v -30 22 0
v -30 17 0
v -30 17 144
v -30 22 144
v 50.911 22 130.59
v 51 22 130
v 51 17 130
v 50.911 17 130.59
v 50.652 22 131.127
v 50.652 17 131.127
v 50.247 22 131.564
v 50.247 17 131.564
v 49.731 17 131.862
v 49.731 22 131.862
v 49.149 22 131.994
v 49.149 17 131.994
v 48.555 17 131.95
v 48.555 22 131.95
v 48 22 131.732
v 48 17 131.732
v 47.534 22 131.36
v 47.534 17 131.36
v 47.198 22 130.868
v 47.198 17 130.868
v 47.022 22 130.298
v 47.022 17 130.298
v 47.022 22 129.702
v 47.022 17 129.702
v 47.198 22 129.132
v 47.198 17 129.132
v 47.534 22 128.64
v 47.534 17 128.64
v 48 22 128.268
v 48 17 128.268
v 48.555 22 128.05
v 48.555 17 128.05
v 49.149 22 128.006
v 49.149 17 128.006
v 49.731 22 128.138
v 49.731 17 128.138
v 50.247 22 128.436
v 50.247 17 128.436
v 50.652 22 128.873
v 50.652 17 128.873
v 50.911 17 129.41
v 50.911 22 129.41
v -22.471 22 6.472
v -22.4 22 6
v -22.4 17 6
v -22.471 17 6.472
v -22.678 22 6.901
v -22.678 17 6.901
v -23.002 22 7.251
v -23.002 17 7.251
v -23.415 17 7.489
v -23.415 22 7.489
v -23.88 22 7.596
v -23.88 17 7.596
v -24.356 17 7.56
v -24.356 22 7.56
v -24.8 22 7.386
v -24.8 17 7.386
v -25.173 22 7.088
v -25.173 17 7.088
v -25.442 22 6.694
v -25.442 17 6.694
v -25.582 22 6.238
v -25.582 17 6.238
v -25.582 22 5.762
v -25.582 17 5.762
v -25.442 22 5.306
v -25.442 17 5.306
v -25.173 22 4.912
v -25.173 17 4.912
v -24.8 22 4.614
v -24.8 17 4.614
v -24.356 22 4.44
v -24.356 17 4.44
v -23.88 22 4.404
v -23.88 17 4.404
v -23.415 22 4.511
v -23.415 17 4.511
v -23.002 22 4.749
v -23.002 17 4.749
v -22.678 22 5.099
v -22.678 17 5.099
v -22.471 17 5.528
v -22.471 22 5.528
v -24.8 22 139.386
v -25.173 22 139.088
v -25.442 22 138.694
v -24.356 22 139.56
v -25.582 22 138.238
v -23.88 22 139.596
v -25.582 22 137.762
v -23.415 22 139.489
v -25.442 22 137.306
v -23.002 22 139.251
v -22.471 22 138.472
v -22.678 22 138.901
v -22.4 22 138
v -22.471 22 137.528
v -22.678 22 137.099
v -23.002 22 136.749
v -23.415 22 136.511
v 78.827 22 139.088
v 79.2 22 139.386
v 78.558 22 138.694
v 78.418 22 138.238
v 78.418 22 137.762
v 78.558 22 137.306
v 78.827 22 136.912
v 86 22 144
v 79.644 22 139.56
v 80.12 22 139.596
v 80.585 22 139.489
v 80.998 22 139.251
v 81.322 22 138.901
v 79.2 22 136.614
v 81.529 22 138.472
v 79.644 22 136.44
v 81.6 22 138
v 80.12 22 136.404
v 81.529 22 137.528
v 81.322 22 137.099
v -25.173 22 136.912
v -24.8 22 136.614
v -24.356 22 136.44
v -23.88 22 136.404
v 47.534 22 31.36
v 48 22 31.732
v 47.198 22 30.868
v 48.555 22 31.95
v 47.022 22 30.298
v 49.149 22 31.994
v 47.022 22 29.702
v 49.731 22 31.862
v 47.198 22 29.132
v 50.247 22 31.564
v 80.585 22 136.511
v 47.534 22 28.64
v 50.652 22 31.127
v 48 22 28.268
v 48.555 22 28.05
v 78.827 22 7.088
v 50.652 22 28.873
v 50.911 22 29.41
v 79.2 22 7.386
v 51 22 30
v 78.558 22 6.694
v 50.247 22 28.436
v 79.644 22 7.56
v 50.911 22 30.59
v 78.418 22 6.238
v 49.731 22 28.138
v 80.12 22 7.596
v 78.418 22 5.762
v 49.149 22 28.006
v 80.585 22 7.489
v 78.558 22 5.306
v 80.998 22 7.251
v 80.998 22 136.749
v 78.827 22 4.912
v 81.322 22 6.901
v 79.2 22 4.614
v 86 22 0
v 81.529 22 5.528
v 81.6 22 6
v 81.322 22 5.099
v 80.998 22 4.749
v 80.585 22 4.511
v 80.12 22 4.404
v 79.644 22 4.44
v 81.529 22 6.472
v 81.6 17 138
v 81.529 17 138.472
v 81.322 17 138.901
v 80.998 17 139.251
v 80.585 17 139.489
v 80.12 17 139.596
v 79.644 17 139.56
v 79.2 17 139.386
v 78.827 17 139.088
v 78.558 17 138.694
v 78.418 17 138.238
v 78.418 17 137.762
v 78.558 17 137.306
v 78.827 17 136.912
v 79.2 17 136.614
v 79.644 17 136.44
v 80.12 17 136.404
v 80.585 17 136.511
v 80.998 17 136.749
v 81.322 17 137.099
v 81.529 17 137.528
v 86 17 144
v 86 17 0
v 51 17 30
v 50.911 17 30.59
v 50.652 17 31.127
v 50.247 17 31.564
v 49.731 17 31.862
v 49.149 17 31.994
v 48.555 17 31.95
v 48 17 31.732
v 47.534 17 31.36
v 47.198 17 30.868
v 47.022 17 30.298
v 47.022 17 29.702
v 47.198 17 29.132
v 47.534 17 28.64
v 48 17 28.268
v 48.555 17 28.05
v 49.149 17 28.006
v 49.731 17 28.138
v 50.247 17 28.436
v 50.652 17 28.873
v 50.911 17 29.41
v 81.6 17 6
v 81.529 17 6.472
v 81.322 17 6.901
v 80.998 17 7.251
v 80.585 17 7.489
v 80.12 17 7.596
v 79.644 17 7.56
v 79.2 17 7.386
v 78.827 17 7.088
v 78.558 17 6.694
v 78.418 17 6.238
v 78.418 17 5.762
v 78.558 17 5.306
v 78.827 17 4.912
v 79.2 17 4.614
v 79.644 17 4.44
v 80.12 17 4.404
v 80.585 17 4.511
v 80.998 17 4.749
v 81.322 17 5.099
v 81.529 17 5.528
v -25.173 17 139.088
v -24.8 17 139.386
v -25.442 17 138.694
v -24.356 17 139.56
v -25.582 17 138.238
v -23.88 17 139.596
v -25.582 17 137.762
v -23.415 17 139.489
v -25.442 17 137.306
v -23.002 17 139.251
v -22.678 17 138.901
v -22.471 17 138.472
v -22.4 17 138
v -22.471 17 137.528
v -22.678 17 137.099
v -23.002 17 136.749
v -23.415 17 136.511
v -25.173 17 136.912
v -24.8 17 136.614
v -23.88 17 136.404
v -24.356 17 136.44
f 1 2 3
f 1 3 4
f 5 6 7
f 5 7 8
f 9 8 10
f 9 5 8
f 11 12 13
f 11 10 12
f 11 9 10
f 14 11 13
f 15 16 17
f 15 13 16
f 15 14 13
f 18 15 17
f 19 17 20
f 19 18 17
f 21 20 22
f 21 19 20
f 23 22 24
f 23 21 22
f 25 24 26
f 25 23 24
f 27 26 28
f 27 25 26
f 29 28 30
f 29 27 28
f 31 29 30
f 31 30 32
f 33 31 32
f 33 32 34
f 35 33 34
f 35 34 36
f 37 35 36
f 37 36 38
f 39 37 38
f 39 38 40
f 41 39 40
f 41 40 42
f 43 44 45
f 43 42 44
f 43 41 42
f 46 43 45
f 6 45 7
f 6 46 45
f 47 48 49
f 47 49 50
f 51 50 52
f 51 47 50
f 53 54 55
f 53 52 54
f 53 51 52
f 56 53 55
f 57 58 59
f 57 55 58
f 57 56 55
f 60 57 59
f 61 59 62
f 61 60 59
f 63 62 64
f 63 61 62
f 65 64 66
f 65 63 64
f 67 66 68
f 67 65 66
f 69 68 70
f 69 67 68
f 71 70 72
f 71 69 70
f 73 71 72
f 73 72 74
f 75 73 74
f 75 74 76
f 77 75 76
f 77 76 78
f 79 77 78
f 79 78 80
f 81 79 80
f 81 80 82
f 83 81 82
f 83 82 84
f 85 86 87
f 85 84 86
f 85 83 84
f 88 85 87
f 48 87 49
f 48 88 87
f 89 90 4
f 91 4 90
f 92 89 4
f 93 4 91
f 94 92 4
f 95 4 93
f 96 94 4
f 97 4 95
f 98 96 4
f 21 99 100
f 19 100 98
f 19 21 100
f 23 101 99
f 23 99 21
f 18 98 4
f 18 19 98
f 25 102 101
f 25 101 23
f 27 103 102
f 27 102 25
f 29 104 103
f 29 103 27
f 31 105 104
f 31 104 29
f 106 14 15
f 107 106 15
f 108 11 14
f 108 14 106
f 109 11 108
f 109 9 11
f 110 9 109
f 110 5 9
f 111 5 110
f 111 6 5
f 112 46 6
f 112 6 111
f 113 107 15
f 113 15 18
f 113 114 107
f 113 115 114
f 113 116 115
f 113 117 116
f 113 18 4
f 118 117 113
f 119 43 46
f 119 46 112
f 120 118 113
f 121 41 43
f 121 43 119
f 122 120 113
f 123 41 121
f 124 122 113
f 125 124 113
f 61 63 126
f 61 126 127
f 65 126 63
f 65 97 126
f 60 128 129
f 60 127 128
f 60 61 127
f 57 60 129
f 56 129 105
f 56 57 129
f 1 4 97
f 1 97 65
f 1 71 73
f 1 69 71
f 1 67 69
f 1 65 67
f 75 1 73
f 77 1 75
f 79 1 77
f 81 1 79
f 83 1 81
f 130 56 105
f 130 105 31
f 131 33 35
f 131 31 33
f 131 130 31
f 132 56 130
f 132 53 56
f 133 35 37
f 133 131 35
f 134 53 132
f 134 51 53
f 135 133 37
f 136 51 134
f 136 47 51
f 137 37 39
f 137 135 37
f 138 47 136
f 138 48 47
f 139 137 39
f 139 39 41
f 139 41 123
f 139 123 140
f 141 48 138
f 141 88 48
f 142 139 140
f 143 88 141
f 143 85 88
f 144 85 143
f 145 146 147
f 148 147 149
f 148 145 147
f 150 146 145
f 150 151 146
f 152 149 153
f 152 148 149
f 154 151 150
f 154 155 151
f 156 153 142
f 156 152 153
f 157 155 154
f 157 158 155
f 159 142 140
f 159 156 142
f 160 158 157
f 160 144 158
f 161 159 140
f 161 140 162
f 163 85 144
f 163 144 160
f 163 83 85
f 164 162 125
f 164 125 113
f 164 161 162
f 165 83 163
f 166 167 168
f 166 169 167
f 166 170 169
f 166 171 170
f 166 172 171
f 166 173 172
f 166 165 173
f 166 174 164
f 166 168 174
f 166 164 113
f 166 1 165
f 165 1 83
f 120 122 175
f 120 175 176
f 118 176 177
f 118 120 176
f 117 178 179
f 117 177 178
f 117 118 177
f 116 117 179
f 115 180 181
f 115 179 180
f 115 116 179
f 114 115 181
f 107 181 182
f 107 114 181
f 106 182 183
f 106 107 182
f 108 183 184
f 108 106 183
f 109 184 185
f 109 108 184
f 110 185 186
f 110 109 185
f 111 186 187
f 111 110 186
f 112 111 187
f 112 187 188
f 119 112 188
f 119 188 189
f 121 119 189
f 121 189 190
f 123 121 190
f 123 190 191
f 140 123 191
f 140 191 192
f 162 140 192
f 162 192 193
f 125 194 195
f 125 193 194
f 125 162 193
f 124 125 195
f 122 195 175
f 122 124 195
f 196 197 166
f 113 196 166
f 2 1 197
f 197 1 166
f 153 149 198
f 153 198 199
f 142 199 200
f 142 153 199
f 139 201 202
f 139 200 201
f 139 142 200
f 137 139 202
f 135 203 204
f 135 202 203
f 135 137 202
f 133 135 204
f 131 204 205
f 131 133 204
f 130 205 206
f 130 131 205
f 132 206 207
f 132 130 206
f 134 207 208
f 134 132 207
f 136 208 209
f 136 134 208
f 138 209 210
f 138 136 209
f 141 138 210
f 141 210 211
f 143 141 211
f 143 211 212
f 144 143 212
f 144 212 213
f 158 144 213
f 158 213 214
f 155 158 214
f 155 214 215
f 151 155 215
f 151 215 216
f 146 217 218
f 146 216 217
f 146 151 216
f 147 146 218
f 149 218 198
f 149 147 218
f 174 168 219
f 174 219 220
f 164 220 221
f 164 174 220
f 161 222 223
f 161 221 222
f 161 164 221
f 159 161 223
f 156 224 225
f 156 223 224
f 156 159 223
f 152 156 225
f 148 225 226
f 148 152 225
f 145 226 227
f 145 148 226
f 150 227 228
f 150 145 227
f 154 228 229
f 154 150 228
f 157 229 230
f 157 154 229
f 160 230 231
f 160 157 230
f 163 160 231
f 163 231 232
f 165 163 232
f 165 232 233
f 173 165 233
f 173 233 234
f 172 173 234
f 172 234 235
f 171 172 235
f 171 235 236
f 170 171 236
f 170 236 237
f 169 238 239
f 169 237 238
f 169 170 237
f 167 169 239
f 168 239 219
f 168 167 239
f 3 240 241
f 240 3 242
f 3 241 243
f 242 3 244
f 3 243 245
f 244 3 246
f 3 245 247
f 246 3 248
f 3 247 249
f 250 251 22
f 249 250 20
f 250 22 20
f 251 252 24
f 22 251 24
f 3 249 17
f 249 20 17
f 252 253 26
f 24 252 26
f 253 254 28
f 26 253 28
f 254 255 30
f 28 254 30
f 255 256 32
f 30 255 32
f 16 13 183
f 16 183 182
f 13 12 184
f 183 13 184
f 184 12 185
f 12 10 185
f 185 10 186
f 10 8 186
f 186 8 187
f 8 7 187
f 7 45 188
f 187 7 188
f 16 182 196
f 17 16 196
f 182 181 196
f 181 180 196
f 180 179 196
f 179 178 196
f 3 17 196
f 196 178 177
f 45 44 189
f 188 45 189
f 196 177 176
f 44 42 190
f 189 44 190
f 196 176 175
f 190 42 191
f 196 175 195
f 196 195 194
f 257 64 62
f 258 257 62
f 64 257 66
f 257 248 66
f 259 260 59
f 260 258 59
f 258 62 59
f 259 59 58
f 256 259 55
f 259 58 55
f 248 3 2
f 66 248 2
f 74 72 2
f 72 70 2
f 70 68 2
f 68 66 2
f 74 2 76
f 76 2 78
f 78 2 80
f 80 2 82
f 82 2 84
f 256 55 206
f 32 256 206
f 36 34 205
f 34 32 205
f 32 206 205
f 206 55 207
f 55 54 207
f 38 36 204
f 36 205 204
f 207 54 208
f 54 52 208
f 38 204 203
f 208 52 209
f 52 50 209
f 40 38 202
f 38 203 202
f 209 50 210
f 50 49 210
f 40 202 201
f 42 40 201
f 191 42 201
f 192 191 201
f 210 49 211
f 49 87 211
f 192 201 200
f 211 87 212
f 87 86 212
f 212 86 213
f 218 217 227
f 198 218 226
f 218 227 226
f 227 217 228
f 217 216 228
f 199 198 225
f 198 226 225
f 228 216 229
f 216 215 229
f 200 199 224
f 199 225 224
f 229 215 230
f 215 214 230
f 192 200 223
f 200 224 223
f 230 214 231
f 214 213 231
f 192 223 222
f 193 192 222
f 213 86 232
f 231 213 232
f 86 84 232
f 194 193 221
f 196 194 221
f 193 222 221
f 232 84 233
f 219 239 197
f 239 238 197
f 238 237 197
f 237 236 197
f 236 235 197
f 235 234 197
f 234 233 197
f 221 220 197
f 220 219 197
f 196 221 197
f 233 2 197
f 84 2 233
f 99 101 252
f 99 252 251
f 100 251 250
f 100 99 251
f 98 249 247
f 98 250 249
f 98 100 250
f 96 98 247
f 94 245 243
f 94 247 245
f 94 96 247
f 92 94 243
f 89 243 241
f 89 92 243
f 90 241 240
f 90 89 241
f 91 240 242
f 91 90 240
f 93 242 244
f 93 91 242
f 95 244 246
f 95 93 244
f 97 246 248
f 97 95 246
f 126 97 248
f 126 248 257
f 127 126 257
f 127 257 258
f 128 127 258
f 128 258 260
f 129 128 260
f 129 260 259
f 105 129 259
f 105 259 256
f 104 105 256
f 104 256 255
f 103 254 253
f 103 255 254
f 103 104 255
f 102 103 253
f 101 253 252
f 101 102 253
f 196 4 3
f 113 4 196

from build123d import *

# Parameters (mm, degrees)
CYLINDER095_R           = 2
CYLINDER095_DEPTH       = 10
CYLINDER095_ROLL_ANGLE  = 90
CYLINDER098_R           = 2
CYLINDER098_DEPTH       = 10
CYLINDER098_ROLL_ANGLE  = 90
CYLINDER019_R           = 1.6
CYLINDER019_DEPTH       = 40
CYLINDER019_PITCH_ANGLE = 90
CYLINDER018_R           = 1.6
CYLINDER018_DEPTH       = 40
CYLINDER018_PITCH_ANGLE = 90
CYLINDER017_R           = 1.6
CYLINDER017_DEPTH       = 40
CYLINDER016_R           = 1.6
CYLINDER016_DEPTH       = 70
CYLINDER016_ROLL_ANGLE  = 90
CYLINDER015_R           = 1.6
CYLINDER015_DEPTH       = 40
BOX018_W                = 116
BOX018_H                = 5
BOX018_DEPTH            = 144


with BuildPart() as cylinder372:
    # Cylinder095 → Cylinder095 (new body)
    with BuildSketch(Plane.XY):
        Circle(CYLINDER095_R)
    extrude(amount=CYLINDER095_DEPTH)


with BuildPart() as cylinder372_1:
    # Cylinder095 roll: moved
    add(cylinder372.part.rotate(Axis((0, 0, 0), (1, 0, 0)), CYLINDER095_ROLL_ANGLE))


with BuildPart() as cylinder372_2:
    # Cylinder095 placement: moved
    add(cylinder372_1.part.moved(Location((49, 25, 30))))


with BuildPart() as cylinder375:
    # Cylinder098 → Cylinder098 (new body)
    with BuildSketch(Plane.XY):
        Circle(CYLINDER098_R)
    extrude(amount=CYLINDER098_DEPTH)


with BuildPart() as cylinder375_1:
    # Cylinder098 roll: moved
    add(cylinder375.part.rotate(Axis((0, 0, 0), (1, 0, 0)), CYLINDER098_ROLL_ANGLE))


with BuildPart() as cylinder375_2:
    # Cylinder098 placement: moved
    add(cylinder375_1.part.moved(Location((49, 25, 130))))


with BuildPart() as cylinder100:
    # Cylinder019 → Cylinder019 (new body)
    with BuildSketch(Plane.XY):
        Circle(CYLINDER019_R)
    extrude(amount=CYLINDER019_DEPTH)


with BuildPart() as cylinder100_1:
    # Cylinder019 pitch: moved
    add(cylinder100.part.rotate(Axis((0, 0, 0), (0, 1, 0)), CYLINDER019_PITCH_ANGLE))


with BuildPart() as cylinder100_2:
    # Cylinder019 placement: moved
    add(cylinder100_1.part.moved(Location((-40, 12, 9.5))))


with BuildPart() as fusion011:
    # Cylinder018 → Cylinder018 (new body)
    with BuildSketch(Plane.XY):
        Circle(CYLINDER018_R)
    extrude(amount=CYLINDER018_DEPTH)


with BuildPart() as fusion011_1:
    # Cylinder018 pitch: moved
    add(fusion011.part.rotate(Axis((0, 0, 0), (0, 1, 0)), CYLINDER018_PITCH_ANGLE))


with BuildPart() as fusion011_2:
    # Cylinder018 placement: moved
    add(fusion011_1.part.moved(Location((-40, -7, 2.5))))

    # Fusion011: union Cylinder100
    add(cylinder100_2.part)


with BuildPart() as fusion012:
    # Cylinder017 → Cylinder017 (new body)
    with BuildSketch(Plane(origin=(-27.5, 7, -15), x_dir=(1, 0, 0), z_dir=(0, 0, 1))):
        Circle(CYLINDER017_R)
    extrude(amount=CYLINDER017_DEPTH)

    # Fusion012: union Fusion011
    add(fusion011_2.part)


with BuildPart() as fusion013:
    # Cylinder016 → Cylinder016 (new body)
    with BuildSketch(Plane.XY):
        Circle(CYLINDER016_R)
    extrude(amount=CYLINDER016_DEPTH)


with BuildPart() as fusion013_1:
    # Cylinder016 roll: moved
    add(fusion013.part.rotate(Axis((0, 0, 0), (1, 0, 0)), CYLINDER016_ROLL_ANGLE))


with BuildPart() as fusion013_2:
    # Cylinder016 placement: moved
    add(fusion013_1.part.moved(Location((-24, 39, 6))))

    # Fusion013: union Fusion012
    add(fusion012.part)


with BuildPart() as cylinder008:
    # Cylinder015 → Cylinder015 (new body)
    with BuildSketch(Plane(origin=(-20.5, -12, -15), x_dir=(1, 0, 0), z_dir=(0, 0, 1))):
        Circle(CYLINDER015_R)
    extrude(amount=CYLINDER015_DEPTH)


with BuildPart() as face_corner_holes003:
    # Fusion017 base: copy of Cylinder008
    add(cylinder008.part)

    # Fusion017: union Fusion013
    add(fusion013_2.part)


with BuildPart() as face_corner_holes003_1:
    # Fusion017 placement: moved
    add(face_corner_holes003.part.moved(Location((104, 0, 132))))


with BuildPart() as face_corner_holes012:
    # Fusion026 base: copy of Cylinder008
    add(cylinder008.part)

    # Fusion026: union Fusion013
    add(fusion013_2.part)


with BuildPart() as face_corner_holes012_1:
    # Fusion026 placement: moved
    add(face_corner_holes012.part.moved(Location((0, 0, 132))))


with BuildPart() as face_corner_holes009:
    # Fusion023 base: copy of Cylinder008
    add(cylinder008.part)

    # Fusion023: union Fusion013
    add(fusion013_2.part)


with BuildPart() as face_corner_holes009_1:
    # Fusion023 placement: moved
    add(face_corner_holes009.part.moved(Location((104, 0, 0))))


with BuildPart() as face_corner_holes006:
    # Fusion020 base: copy of Cylinder008
    add(cylinder008.part)

    # Fusion020: union Fusion013
    add(fusion013_2.part)


with BuildPart() as front_a:
    # Box018 → Box018 (new body)
    with BuildSketch(Plane(origin=(-30, 17, 0), x_dir=(1, 0, 0), z_dir=(0, 0, 1))):
        with Locations((58, 2.5)):
            Rectangle(BOX018_W, BOX018_H)
    extrude(amount=BOX018_DEPTH)

    # Cut015: cut face-corner-holes006
    add(face_corner_holes006.part, mode=Mode.SUBTRACT)

    # Cut019: cut face-corner-holes009
    add(face_corner_holes009_1.part, mode=Mode.SUBTRACT)

    # Cut023: cut face-corner-holes012
    add(face_corner_holes012_1.part, mode=Mode.SUBTRACT)

    # Cut026: cut face-corner-holes003
    add(face_corner_holes003_1.part, mode=Mode.SUBTRACT)

    # Cut059: cut Cylinder375
    add(cylinder375_2.part, mode=Mode.SUBTRACT)

    # Cut060: cut Cylinder372
    add(cylinder372_2.part, mode=Mode.SUBTRACT)


solid = front_a.part
